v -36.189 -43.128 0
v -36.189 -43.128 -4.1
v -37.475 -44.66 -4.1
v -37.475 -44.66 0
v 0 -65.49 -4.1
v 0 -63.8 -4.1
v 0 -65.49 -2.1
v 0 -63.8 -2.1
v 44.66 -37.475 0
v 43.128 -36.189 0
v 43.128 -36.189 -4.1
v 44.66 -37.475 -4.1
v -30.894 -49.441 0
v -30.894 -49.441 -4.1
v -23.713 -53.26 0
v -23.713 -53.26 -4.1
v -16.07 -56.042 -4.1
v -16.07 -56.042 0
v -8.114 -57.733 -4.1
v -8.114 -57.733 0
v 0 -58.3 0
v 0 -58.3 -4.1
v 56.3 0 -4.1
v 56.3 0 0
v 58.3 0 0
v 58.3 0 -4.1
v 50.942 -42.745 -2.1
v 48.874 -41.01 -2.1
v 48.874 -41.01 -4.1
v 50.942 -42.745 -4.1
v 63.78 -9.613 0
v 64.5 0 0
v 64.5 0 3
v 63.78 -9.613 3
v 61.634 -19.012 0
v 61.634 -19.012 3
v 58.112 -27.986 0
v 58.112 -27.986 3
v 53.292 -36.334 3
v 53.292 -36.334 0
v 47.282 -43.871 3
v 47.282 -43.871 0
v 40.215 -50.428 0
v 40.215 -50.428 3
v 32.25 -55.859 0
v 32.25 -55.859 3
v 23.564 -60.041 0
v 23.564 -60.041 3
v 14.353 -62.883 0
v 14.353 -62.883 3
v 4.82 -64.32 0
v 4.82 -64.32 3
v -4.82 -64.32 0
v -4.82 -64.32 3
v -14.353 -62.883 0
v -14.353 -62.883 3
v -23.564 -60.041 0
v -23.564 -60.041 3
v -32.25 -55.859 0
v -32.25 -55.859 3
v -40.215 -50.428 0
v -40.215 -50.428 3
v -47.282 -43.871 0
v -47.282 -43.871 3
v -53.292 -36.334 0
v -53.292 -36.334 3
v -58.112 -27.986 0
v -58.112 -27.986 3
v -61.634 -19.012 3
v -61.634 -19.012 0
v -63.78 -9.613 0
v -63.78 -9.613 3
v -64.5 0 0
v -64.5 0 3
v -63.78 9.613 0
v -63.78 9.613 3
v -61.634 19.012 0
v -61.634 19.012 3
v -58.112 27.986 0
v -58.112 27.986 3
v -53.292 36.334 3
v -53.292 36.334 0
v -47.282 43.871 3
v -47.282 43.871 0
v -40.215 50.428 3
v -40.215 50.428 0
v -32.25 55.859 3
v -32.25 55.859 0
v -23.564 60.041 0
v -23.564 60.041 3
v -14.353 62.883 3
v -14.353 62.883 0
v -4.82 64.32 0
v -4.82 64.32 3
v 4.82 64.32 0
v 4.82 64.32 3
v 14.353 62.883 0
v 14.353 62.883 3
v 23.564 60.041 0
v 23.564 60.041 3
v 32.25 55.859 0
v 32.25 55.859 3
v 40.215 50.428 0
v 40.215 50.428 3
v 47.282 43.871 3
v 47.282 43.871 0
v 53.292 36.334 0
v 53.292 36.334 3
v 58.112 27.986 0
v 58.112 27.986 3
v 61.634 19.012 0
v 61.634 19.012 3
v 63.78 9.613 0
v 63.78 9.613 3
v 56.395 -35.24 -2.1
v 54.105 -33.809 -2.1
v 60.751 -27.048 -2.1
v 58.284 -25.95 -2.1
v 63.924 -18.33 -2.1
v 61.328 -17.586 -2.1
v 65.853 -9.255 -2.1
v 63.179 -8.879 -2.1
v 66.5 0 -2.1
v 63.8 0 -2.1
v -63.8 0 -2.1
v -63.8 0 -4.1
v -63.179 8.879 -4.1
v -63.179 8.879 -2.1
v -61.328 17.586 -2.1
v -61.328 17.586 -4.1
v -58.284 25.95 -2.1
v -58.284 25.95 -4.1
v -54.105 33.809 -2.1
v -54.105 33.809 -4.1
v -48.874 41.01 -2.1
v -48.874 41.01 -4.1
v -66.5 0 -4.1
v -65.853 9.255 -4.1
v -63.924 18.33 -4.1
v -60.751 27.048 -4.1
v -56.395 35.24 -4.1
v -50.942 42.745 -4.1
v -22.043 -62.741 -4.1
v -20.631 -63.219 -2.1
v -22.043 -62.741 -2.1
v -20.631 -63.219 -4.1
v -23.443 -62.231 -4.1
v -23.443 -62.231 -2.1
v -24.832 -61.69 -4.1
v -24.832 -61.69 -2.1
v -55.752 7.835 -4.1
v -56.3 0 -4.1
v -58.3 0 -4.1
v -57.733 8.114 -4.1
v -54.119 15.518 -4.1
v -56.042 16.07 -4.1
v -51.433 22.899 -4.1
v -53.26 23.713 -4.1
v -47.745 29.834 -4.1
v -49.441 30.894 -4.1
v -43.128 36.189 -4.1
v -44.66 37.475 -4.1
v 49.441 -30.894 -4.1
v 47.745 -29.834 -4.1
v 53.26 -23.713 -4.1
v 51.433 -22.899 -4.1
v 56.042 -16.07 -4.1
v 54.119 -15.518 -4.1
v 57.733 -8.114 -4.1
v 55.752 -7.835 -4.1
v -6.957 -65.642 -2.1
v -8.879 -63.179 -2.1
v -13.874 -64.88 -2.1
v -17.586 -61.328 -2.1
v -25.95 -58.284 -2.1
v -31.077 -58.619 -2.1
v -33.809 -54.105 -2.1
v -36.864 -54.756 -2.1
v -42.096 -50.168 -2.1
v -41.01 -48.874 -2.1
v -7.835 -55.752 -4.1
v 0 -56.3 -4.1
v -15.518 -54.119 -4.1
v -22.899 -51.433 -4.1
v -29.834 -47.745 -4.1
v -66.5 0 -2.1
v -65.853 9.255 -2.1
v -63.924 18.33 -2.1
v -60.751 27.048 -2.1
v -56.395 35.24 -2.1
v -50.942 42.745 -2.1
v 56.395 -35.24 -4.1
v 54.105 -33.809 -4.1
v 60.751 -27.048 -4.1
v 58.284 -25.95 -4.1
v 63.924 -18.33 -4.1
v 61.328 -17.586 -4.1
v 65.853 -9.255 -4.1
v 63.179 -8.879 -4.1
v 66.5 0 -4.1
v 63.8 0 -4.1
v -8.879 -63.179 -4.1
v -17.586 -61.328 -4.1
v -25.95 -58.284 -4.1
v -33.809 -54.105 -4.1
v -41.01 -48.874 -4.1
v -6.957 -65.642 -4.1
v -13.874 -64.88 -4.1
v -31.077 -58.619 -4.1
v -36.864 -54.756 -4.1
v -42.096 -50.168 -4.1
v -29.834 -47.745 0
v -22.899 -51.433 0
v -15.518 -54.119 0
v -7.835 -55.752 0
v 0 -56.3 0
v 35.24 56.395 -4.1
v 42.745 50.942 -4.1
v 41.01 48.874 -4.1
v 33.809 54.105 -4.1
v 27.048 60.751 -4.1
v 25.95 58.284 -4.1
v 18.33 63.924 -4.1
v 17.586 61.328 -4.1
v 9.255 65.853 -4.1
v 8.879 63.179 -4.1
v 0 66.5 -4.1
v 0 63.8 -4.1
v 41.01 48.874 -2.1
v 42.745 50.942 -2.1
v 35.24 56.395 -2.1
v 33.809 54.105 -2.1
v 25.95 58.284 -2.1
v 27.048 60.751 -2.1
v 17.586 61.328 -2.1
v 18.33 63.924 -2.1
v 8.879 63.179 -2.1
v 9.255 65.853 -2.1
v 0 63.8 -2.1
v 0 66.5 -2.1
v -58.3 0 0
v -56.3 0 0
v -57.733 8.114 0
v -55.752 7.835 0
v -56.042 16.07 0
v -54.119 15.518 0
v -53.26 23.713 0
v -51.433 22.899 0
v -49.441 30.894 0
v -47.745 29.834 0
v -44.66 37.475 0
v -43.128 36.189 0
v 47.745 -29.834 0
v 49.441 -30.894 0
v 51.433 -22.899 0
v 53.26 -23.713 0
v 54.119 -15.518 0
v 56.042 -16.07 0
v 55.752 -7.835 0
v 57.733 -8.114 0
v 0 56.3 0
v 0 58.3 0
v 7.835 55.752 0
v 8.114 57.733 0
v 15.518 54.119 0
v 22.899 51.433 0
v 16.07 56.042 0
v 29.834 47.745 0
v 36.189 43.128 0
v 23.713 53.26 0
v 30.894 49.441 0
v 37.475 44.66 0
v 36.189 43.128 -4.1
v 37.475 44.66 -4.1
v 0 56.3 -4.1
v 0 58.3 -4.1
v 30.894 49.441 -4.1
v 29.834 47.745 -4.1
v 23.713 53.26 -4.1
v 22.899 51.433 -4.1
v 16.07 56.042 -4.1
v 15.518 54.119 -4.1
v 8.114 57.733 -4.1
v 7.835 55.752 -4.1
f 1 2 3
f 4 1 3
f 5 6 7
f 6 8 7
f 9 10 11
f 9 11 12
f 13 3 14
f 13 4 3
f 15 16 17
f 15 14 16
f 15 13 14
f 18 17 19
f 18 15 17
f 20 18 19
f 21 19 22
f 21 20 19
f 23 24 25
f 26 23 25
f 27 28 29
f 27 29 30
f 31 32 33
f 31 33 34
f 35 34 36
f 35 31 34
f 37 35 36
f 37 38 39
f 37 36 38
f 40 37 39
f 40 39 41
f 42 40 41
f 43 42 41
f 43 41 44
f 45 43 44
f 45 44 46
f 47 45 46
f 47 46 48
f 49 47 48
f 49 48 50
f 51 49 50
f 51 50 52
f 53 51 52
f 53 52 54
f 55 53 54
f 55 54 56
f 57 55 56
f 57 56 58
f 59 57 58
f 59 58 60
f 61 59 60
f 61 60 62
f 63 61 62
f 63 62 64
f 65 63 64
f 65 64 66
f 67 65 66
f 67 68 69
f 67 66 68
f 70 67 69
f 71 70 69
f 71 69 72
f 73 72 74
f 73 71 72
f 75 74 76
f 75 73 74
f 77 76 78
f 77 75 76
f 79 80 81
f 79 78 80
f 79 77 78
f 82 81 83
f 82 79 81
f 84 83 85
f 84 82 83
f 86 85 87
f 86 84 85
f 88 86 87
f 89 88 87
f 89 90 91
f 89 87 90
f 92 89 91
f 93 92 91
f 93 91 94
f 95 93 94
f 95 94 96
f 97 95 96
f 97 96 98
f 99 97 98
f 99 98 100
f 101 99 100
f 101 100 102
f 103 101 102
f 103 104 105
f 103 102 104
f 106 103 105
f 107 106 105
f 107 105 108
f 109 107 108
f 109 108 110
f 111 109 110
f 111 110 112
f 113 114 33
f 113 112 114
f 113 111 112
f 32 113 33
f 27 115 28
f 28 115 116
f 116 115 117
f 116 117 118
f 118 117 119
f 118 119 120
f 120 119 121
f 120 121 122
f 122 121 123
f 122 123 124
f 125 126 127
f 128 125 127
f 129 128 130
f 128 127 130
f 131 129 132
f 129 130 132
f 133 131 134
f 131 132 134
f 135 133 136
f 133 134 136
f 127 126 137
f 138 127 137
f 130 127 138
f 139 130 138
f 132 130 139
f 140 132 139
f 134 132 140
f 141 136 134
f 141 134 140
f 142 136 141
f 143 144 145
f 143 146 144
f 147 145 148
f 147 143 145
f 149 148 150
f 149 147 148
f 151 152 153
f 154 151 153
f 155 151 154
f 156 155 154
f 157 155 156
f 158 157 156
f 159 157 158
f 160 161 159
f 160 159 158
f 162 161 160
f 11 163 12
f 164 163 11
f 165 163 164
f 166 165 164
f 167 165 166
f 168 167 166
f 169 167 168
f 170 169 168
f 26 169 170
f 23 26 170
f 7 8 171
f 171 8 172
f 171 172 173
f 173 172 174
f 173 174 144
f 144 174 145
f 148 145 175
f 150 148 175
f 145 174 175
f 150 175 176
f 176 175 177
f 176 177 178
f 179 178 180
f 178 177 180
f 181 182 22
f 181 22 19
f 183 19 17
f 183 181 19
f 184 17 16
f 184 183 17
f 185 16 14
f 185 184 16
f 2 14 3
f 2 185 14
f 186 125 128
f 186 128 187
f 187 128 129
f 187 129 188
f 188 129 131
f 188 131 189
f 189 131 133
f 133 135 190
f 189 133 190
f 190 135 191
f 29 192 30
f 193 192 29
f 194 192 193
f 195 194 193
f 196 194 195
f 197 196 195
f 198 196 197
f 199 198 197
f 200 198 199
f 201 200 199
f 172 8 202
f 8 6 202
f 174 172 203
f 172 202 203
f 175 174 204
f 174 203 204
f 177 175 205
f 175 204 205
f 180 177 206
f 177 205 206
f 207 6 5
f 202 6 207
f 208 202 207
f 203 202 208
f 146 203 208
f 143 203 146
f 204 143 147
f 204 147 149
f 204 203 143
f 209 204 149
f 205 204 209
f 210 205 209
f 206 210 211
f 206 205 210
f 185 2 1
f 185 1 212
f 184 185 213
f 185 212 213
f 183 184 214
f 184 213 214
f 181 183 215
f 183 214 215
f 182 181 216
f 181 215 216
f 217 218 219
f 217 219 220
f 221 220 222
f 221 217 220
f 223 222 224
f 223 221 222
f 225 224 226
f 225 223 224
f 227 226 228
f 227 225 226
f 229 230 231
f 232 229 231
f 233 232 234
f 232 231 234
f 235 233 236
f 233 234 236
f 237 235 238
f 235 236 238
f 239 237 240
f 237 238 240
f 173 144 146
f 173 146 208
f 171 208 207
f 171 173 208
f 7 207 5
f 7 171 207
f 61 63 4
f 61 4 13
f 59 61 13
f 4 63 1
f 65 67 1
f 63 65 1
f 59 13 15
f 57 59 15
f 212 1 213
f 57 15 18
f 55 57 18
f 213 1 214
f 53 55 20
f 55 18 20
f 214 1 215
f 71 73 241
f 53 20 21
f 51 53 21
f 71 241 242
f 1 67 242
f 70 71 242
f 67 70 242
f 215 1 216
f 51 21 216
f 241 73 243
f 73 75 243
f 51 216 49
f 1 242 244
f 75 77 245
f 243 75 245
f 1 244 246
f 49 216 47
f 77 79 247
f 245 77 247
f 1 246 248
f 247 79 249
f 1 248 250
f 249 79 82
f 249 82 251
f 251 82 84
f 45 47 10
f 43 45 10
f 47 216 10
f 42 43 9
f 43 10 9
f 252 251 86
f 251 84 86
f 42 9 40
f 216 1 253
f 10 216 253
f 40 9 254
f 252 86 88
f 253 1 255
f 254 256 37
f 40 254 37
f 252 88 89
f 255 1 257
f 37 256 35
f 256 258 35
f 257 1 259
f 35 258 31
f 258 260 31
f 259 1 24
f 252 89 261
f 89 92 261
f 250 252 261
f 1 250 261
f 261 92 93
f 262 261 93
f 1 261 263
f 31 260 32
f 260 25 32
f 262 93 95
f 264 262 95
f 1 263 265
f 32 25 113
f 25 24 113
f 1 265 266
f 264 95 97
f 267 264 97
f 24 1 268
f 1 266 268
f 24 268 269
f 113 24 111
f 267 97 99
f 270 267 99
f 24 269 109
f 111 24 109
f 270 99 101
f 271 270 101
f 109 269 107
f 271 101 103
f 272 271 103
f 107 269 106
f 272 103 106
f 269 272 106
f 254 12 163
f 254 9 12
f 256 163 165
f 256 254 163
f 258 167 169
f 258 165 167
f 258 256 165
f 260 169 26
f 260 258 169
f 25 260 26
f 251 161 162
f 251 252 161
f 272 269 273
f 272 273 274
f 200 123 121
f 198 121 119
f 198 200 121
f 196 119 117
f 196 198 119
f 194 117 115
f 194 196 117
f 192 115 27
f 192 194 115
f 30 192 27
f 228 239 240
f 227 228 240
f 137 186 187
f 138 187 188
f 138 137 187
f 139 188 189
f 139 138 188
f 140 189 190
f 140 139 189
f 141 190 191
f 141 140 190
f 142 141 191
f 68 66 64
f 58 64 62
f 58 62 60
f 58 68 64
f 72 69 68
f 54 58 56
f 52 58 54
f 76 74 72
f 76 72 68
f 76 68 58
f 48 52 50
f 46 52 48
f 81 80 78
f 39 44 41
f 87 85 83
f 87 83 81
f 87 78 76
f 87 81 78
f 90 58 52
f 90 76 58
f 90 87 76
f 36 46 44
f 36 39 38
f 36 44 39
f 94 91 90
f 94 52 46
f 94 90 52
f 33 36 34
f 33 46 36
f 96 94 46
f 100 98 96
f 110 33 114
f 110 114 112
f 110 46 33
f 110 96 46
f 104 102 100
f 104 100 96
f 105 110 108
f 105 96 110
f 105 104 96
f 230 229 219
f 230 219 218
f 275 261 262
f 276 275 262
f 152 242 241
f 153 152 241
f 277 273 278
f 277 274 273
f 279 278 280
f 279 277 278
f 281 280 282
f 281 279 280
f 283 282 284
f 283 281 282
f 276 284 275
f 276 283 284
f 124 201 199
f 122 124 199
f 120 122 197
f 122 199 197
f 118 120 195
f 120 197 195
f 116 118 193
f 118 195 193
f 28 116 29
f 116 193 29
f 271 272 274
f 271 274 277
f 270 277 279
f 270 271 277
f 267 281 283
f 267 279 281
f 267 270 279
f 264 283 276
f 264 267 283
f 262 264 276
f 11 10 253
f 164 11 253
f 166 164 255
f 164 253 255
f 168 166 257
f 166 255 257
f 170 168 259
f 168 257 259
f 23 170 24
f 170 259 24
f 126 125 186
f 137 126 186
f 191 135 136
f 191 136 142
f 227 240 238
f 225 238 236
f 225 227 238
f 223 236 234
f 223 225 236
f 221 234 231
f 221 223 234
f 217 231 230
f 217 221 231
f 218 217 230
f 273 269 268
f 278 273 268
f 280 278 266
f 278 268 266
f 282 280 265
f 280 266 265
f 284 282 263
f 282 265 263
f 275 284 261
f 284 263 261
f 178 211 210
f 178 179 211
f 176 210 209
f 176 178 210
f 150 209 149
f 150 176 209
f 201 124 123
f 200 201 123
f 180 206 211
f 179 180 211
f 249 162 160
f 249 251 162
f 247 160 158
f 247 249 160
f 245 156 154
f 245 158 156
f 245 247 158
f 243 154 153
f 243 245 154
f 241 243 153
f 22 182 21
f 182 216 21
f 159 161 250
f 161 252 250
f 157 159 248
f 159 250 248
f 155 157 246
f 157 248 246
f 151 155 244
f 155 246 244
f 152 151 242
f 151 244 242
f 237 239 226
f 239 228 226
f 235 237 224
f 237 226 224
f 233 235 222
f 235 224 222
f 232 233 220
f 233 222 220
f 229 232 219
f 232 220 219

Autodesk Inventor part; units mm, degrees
ref_plane "YZ Plane" through (0, 0, 0) normal (1, 0, 0) x (0, 1, 0)
ref_plane "XZ Plane" through (0, 0, 0) normal (0, 1, 0) x (-1, 0, 0)
sketch "Skizze2" plane through (0, 0, 0) normal (0, 0, 1) x (1, 0, 0)
  circle A0 centre (0, 0) radius 64.5
  point P0 (1.5625, 1.8697)
  dimension "d1" = 129
extrude "Extrusion1" add sketch "Skizze2" along normal blind 3
ref_plane "Arbeitsebene1" through (0, 0, -5) normal (0, 0, 1) x (1, 0, 0)
sketch "Skizze16" plane through (0, 0, 0) normal (0, 0, -1) x (-1, 0, 0)
  circle A0 centre (0, 0) radius 58.3
  circle A1 centre (0, 0) radius 64.5 projected
  circle A2 centre (0, 0) radius 56.3
  dimension "d49" = 6.2
  dimension "d50" = 2
extrude "Extrusion2" add sketch "Skizze16" along normal blind 4.1 contours A0
sketch "Skizze17" plane through (0, 0, -4.1) normal (0, 0, -1) x (-1, 0, 0)
  circle A0 centre (0, 0) radius 63.8
  circle A1 centre (0, 0) radius 66.5
  circle A2 centre (0, 0) radius 58.3 projected
  dimension "d53" = 2.7
  dimension "d54" = 127.6
extrude "Extrusion3" add sketch "Skizze17" against normal blind 2 contours A1
sketch "Skizze18" plane through (0, 0, 0) normal (0, 0, -1) x (-1, 0, 0)
  circle A0 centre (0, 0) radius 66.5 projected
  line L0 (0, 0) -> (0, 66.5)
  line L1 (0, 0) -> (50.942, 42.7454)
  line L2 (0, 0) -> (66.5, 0)
  line L3 (0, 0) -> (42.096, -50.168)
  line L4 (0, 0) -> (0, -65.4897)
  line L5 (0, 0) -> (-50.942, -42.7454)
  line L6 (0, 0) -> (-66.5, 0)
  line L7 (0, 0) -> (-42.7454, 50.942)
  arc A1 (66.5, 0) -> (50.942, 42.7454) centre (0, 0) ccw
  arc A2 (0, 66.5) -> (-42.7454, 50.942) centre (0, 0) ccw
  arc A3 (-66.5, 0) -> (-50.942, -42.7454) centre (0, 0) ccw
  arc A4 (0, -65.4897) -> (42.096, -50.168) centre (4.6329, -12.7289) ccw
  point P0 (-50.942, -42.7454)
  point P1 (-11.5476, -65.4897)
  point P2 (42.7454, -50.942)
  point P3 (20.6268, -63.2201)
  point P4 (24.8361, -61.6881)
  dimension "d57" = 50
  dimension "d58" = 50
  dimension "d59" = 50
  dimension "d60" = 40
  dimension "d61" = 50
  dimension "d64" = 40
extrude "Extrusion4" cut sketch "Skizze18" along normal up to surface (4.1 mm away) contours A0 A4 L3 L2 | L1 L0 A0 | L4 A4 A0 L5 | L6 A0 L7
properties part number "GehaeuseteilA"
